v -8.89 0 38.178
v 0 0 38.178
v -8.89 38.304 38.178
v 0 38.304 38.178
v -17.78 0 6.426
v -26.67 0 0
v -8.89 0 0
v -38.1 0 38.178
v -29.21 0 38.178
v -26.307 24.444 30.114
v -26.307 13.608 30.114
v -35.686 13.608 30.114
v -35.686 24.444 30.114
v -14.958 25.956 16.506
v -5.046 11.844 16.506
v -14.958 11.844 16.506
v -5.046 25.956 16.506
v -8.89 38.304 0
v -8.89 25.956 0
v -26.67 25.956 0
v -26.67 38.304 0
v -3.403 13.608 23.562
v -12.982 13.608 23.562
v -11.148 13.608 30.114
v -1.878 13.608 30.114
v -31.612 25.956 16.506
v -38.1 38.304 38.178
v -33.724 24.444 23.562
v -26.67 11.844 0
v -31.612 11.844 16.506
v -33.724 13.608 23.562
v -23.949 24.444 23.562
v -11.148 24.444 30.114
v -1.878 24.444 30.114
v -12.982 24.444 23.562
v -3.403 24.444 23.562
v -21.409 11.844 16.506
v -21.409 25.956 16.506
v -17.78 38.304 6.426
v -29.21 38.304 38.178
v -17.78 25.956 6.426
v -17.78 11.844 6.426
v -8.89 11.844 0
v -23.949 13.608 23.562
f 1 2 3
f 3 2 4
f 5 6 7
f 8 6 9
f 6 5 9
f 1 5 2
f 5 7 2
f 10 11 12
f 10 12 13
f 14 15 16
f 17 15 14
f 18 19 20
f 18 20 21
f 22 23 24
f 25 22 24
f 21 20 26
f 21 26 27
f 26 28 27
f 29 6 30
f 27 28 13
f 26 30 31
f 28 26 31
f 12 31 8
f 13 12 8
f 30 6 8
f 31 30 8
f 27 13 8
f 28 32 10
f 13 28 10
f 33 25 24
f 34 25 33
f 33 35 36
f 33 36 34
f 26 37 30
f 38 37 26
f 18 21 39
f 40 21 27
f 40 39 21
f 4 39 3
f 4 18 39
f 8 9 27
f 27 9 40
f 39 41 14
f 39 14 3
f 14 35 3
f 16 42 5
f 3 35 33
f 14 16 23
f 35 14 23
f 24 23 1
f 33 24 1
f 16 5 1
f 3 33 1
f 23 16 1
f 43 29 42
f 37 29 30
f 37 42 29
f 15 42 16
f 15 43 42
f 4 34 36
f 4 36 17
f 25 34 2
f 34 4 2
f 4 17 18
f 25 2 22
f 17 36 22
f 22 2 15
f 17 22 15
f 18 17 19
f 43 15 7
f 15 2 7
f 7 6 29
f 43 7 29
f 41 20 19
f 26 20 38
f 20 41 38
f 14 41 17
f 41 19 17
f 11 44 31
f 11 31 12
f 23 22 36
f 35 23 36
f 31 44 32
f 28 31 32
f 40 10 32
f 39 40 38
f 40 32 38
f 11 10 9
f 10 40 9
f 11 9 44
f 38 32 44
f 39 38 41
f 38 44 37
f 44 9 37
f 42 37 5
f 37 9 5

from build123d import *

# Parameters (mm, degrees)
F0_W     = 38.3040010929
F0_H     = 38.1780005991
F1_DEPTH = 38.1
F2_W     = 10.8359996229
F2_H     = 6.5519977361
F2_W_2   = 14.112001285
F2_H_2   = 16.5060013533
F3_DEPTH = 38.1
F5_DEPTH = 38.1
F6_DEPTH = 25.4
F7_DEPTH = 25.4


with BuildPart() as f1:
    # F0 (on Right) → F1 (new body)
    with BuildSketch(Plane.YZ):
        with Locations((19.1520005465, 19.0890002996)):
            Rectangle(F0_W, F0_H)
    extrude(amount=-F1_DEPTH)

    # F2 (on Right) → F3 (cut)
    with BuildSketch(Plane.YZ):
        with Locations((19.0259991214, 26.8379999325)):
            Rectangle(F2_W, F2_H)
        with Locations((18.9000004902, 8.2530006766)):
            Rectangle(F2_W_2, F2_H_2)
    extrude(amount=-F3_DEPTH, mode=Mode.SUBTRACT)

    # F4 (on face) → F5 (cut)
    with BuildSketch(Plane.XZ):
        Polygon((-17.78, 6.426000502), (-8.89, 38.1780005991), (-29.21, 38.1780005991), align=None)
        Polygon((-38.1, 0), (-26.67, 0), (-38.1, 38.1780005991), align=None)
        Polygon((-8.89, 0), (0, 0), (0, 38.1780005991), align=None)
    extrude(amount=-F5_DEPTH, mode=Mode.SUBTRACT)

    # F6 (cut): faces of the model
    f6_faces = [f1.faces().sort_by_distance(p)[0] for p in [
        (-18.6266666667, 38.1, 27.5940005668),
        (-34.29, 38.1, 12.7260001997),
        (-2.9633333333, 38.1, 12.7260001997),
    ]]
    extrude(f6_faces, amount=-F6_DEPTH, mode=Mode.SUBTRACT)

    # F7 (cut): faces of the model
    f7_faces = [f1.faces().sort_by_distance(p)[0] for p in [
        (-4.445, 19.1520005465, 38.1780005991),
        (-33.655, 19.1520005465, 38.1780005991),
    ]]
    extrude(f7_faces, amount=F7_DEPTH, mode=Mode.SUBTRACT)


solid = f1.part
